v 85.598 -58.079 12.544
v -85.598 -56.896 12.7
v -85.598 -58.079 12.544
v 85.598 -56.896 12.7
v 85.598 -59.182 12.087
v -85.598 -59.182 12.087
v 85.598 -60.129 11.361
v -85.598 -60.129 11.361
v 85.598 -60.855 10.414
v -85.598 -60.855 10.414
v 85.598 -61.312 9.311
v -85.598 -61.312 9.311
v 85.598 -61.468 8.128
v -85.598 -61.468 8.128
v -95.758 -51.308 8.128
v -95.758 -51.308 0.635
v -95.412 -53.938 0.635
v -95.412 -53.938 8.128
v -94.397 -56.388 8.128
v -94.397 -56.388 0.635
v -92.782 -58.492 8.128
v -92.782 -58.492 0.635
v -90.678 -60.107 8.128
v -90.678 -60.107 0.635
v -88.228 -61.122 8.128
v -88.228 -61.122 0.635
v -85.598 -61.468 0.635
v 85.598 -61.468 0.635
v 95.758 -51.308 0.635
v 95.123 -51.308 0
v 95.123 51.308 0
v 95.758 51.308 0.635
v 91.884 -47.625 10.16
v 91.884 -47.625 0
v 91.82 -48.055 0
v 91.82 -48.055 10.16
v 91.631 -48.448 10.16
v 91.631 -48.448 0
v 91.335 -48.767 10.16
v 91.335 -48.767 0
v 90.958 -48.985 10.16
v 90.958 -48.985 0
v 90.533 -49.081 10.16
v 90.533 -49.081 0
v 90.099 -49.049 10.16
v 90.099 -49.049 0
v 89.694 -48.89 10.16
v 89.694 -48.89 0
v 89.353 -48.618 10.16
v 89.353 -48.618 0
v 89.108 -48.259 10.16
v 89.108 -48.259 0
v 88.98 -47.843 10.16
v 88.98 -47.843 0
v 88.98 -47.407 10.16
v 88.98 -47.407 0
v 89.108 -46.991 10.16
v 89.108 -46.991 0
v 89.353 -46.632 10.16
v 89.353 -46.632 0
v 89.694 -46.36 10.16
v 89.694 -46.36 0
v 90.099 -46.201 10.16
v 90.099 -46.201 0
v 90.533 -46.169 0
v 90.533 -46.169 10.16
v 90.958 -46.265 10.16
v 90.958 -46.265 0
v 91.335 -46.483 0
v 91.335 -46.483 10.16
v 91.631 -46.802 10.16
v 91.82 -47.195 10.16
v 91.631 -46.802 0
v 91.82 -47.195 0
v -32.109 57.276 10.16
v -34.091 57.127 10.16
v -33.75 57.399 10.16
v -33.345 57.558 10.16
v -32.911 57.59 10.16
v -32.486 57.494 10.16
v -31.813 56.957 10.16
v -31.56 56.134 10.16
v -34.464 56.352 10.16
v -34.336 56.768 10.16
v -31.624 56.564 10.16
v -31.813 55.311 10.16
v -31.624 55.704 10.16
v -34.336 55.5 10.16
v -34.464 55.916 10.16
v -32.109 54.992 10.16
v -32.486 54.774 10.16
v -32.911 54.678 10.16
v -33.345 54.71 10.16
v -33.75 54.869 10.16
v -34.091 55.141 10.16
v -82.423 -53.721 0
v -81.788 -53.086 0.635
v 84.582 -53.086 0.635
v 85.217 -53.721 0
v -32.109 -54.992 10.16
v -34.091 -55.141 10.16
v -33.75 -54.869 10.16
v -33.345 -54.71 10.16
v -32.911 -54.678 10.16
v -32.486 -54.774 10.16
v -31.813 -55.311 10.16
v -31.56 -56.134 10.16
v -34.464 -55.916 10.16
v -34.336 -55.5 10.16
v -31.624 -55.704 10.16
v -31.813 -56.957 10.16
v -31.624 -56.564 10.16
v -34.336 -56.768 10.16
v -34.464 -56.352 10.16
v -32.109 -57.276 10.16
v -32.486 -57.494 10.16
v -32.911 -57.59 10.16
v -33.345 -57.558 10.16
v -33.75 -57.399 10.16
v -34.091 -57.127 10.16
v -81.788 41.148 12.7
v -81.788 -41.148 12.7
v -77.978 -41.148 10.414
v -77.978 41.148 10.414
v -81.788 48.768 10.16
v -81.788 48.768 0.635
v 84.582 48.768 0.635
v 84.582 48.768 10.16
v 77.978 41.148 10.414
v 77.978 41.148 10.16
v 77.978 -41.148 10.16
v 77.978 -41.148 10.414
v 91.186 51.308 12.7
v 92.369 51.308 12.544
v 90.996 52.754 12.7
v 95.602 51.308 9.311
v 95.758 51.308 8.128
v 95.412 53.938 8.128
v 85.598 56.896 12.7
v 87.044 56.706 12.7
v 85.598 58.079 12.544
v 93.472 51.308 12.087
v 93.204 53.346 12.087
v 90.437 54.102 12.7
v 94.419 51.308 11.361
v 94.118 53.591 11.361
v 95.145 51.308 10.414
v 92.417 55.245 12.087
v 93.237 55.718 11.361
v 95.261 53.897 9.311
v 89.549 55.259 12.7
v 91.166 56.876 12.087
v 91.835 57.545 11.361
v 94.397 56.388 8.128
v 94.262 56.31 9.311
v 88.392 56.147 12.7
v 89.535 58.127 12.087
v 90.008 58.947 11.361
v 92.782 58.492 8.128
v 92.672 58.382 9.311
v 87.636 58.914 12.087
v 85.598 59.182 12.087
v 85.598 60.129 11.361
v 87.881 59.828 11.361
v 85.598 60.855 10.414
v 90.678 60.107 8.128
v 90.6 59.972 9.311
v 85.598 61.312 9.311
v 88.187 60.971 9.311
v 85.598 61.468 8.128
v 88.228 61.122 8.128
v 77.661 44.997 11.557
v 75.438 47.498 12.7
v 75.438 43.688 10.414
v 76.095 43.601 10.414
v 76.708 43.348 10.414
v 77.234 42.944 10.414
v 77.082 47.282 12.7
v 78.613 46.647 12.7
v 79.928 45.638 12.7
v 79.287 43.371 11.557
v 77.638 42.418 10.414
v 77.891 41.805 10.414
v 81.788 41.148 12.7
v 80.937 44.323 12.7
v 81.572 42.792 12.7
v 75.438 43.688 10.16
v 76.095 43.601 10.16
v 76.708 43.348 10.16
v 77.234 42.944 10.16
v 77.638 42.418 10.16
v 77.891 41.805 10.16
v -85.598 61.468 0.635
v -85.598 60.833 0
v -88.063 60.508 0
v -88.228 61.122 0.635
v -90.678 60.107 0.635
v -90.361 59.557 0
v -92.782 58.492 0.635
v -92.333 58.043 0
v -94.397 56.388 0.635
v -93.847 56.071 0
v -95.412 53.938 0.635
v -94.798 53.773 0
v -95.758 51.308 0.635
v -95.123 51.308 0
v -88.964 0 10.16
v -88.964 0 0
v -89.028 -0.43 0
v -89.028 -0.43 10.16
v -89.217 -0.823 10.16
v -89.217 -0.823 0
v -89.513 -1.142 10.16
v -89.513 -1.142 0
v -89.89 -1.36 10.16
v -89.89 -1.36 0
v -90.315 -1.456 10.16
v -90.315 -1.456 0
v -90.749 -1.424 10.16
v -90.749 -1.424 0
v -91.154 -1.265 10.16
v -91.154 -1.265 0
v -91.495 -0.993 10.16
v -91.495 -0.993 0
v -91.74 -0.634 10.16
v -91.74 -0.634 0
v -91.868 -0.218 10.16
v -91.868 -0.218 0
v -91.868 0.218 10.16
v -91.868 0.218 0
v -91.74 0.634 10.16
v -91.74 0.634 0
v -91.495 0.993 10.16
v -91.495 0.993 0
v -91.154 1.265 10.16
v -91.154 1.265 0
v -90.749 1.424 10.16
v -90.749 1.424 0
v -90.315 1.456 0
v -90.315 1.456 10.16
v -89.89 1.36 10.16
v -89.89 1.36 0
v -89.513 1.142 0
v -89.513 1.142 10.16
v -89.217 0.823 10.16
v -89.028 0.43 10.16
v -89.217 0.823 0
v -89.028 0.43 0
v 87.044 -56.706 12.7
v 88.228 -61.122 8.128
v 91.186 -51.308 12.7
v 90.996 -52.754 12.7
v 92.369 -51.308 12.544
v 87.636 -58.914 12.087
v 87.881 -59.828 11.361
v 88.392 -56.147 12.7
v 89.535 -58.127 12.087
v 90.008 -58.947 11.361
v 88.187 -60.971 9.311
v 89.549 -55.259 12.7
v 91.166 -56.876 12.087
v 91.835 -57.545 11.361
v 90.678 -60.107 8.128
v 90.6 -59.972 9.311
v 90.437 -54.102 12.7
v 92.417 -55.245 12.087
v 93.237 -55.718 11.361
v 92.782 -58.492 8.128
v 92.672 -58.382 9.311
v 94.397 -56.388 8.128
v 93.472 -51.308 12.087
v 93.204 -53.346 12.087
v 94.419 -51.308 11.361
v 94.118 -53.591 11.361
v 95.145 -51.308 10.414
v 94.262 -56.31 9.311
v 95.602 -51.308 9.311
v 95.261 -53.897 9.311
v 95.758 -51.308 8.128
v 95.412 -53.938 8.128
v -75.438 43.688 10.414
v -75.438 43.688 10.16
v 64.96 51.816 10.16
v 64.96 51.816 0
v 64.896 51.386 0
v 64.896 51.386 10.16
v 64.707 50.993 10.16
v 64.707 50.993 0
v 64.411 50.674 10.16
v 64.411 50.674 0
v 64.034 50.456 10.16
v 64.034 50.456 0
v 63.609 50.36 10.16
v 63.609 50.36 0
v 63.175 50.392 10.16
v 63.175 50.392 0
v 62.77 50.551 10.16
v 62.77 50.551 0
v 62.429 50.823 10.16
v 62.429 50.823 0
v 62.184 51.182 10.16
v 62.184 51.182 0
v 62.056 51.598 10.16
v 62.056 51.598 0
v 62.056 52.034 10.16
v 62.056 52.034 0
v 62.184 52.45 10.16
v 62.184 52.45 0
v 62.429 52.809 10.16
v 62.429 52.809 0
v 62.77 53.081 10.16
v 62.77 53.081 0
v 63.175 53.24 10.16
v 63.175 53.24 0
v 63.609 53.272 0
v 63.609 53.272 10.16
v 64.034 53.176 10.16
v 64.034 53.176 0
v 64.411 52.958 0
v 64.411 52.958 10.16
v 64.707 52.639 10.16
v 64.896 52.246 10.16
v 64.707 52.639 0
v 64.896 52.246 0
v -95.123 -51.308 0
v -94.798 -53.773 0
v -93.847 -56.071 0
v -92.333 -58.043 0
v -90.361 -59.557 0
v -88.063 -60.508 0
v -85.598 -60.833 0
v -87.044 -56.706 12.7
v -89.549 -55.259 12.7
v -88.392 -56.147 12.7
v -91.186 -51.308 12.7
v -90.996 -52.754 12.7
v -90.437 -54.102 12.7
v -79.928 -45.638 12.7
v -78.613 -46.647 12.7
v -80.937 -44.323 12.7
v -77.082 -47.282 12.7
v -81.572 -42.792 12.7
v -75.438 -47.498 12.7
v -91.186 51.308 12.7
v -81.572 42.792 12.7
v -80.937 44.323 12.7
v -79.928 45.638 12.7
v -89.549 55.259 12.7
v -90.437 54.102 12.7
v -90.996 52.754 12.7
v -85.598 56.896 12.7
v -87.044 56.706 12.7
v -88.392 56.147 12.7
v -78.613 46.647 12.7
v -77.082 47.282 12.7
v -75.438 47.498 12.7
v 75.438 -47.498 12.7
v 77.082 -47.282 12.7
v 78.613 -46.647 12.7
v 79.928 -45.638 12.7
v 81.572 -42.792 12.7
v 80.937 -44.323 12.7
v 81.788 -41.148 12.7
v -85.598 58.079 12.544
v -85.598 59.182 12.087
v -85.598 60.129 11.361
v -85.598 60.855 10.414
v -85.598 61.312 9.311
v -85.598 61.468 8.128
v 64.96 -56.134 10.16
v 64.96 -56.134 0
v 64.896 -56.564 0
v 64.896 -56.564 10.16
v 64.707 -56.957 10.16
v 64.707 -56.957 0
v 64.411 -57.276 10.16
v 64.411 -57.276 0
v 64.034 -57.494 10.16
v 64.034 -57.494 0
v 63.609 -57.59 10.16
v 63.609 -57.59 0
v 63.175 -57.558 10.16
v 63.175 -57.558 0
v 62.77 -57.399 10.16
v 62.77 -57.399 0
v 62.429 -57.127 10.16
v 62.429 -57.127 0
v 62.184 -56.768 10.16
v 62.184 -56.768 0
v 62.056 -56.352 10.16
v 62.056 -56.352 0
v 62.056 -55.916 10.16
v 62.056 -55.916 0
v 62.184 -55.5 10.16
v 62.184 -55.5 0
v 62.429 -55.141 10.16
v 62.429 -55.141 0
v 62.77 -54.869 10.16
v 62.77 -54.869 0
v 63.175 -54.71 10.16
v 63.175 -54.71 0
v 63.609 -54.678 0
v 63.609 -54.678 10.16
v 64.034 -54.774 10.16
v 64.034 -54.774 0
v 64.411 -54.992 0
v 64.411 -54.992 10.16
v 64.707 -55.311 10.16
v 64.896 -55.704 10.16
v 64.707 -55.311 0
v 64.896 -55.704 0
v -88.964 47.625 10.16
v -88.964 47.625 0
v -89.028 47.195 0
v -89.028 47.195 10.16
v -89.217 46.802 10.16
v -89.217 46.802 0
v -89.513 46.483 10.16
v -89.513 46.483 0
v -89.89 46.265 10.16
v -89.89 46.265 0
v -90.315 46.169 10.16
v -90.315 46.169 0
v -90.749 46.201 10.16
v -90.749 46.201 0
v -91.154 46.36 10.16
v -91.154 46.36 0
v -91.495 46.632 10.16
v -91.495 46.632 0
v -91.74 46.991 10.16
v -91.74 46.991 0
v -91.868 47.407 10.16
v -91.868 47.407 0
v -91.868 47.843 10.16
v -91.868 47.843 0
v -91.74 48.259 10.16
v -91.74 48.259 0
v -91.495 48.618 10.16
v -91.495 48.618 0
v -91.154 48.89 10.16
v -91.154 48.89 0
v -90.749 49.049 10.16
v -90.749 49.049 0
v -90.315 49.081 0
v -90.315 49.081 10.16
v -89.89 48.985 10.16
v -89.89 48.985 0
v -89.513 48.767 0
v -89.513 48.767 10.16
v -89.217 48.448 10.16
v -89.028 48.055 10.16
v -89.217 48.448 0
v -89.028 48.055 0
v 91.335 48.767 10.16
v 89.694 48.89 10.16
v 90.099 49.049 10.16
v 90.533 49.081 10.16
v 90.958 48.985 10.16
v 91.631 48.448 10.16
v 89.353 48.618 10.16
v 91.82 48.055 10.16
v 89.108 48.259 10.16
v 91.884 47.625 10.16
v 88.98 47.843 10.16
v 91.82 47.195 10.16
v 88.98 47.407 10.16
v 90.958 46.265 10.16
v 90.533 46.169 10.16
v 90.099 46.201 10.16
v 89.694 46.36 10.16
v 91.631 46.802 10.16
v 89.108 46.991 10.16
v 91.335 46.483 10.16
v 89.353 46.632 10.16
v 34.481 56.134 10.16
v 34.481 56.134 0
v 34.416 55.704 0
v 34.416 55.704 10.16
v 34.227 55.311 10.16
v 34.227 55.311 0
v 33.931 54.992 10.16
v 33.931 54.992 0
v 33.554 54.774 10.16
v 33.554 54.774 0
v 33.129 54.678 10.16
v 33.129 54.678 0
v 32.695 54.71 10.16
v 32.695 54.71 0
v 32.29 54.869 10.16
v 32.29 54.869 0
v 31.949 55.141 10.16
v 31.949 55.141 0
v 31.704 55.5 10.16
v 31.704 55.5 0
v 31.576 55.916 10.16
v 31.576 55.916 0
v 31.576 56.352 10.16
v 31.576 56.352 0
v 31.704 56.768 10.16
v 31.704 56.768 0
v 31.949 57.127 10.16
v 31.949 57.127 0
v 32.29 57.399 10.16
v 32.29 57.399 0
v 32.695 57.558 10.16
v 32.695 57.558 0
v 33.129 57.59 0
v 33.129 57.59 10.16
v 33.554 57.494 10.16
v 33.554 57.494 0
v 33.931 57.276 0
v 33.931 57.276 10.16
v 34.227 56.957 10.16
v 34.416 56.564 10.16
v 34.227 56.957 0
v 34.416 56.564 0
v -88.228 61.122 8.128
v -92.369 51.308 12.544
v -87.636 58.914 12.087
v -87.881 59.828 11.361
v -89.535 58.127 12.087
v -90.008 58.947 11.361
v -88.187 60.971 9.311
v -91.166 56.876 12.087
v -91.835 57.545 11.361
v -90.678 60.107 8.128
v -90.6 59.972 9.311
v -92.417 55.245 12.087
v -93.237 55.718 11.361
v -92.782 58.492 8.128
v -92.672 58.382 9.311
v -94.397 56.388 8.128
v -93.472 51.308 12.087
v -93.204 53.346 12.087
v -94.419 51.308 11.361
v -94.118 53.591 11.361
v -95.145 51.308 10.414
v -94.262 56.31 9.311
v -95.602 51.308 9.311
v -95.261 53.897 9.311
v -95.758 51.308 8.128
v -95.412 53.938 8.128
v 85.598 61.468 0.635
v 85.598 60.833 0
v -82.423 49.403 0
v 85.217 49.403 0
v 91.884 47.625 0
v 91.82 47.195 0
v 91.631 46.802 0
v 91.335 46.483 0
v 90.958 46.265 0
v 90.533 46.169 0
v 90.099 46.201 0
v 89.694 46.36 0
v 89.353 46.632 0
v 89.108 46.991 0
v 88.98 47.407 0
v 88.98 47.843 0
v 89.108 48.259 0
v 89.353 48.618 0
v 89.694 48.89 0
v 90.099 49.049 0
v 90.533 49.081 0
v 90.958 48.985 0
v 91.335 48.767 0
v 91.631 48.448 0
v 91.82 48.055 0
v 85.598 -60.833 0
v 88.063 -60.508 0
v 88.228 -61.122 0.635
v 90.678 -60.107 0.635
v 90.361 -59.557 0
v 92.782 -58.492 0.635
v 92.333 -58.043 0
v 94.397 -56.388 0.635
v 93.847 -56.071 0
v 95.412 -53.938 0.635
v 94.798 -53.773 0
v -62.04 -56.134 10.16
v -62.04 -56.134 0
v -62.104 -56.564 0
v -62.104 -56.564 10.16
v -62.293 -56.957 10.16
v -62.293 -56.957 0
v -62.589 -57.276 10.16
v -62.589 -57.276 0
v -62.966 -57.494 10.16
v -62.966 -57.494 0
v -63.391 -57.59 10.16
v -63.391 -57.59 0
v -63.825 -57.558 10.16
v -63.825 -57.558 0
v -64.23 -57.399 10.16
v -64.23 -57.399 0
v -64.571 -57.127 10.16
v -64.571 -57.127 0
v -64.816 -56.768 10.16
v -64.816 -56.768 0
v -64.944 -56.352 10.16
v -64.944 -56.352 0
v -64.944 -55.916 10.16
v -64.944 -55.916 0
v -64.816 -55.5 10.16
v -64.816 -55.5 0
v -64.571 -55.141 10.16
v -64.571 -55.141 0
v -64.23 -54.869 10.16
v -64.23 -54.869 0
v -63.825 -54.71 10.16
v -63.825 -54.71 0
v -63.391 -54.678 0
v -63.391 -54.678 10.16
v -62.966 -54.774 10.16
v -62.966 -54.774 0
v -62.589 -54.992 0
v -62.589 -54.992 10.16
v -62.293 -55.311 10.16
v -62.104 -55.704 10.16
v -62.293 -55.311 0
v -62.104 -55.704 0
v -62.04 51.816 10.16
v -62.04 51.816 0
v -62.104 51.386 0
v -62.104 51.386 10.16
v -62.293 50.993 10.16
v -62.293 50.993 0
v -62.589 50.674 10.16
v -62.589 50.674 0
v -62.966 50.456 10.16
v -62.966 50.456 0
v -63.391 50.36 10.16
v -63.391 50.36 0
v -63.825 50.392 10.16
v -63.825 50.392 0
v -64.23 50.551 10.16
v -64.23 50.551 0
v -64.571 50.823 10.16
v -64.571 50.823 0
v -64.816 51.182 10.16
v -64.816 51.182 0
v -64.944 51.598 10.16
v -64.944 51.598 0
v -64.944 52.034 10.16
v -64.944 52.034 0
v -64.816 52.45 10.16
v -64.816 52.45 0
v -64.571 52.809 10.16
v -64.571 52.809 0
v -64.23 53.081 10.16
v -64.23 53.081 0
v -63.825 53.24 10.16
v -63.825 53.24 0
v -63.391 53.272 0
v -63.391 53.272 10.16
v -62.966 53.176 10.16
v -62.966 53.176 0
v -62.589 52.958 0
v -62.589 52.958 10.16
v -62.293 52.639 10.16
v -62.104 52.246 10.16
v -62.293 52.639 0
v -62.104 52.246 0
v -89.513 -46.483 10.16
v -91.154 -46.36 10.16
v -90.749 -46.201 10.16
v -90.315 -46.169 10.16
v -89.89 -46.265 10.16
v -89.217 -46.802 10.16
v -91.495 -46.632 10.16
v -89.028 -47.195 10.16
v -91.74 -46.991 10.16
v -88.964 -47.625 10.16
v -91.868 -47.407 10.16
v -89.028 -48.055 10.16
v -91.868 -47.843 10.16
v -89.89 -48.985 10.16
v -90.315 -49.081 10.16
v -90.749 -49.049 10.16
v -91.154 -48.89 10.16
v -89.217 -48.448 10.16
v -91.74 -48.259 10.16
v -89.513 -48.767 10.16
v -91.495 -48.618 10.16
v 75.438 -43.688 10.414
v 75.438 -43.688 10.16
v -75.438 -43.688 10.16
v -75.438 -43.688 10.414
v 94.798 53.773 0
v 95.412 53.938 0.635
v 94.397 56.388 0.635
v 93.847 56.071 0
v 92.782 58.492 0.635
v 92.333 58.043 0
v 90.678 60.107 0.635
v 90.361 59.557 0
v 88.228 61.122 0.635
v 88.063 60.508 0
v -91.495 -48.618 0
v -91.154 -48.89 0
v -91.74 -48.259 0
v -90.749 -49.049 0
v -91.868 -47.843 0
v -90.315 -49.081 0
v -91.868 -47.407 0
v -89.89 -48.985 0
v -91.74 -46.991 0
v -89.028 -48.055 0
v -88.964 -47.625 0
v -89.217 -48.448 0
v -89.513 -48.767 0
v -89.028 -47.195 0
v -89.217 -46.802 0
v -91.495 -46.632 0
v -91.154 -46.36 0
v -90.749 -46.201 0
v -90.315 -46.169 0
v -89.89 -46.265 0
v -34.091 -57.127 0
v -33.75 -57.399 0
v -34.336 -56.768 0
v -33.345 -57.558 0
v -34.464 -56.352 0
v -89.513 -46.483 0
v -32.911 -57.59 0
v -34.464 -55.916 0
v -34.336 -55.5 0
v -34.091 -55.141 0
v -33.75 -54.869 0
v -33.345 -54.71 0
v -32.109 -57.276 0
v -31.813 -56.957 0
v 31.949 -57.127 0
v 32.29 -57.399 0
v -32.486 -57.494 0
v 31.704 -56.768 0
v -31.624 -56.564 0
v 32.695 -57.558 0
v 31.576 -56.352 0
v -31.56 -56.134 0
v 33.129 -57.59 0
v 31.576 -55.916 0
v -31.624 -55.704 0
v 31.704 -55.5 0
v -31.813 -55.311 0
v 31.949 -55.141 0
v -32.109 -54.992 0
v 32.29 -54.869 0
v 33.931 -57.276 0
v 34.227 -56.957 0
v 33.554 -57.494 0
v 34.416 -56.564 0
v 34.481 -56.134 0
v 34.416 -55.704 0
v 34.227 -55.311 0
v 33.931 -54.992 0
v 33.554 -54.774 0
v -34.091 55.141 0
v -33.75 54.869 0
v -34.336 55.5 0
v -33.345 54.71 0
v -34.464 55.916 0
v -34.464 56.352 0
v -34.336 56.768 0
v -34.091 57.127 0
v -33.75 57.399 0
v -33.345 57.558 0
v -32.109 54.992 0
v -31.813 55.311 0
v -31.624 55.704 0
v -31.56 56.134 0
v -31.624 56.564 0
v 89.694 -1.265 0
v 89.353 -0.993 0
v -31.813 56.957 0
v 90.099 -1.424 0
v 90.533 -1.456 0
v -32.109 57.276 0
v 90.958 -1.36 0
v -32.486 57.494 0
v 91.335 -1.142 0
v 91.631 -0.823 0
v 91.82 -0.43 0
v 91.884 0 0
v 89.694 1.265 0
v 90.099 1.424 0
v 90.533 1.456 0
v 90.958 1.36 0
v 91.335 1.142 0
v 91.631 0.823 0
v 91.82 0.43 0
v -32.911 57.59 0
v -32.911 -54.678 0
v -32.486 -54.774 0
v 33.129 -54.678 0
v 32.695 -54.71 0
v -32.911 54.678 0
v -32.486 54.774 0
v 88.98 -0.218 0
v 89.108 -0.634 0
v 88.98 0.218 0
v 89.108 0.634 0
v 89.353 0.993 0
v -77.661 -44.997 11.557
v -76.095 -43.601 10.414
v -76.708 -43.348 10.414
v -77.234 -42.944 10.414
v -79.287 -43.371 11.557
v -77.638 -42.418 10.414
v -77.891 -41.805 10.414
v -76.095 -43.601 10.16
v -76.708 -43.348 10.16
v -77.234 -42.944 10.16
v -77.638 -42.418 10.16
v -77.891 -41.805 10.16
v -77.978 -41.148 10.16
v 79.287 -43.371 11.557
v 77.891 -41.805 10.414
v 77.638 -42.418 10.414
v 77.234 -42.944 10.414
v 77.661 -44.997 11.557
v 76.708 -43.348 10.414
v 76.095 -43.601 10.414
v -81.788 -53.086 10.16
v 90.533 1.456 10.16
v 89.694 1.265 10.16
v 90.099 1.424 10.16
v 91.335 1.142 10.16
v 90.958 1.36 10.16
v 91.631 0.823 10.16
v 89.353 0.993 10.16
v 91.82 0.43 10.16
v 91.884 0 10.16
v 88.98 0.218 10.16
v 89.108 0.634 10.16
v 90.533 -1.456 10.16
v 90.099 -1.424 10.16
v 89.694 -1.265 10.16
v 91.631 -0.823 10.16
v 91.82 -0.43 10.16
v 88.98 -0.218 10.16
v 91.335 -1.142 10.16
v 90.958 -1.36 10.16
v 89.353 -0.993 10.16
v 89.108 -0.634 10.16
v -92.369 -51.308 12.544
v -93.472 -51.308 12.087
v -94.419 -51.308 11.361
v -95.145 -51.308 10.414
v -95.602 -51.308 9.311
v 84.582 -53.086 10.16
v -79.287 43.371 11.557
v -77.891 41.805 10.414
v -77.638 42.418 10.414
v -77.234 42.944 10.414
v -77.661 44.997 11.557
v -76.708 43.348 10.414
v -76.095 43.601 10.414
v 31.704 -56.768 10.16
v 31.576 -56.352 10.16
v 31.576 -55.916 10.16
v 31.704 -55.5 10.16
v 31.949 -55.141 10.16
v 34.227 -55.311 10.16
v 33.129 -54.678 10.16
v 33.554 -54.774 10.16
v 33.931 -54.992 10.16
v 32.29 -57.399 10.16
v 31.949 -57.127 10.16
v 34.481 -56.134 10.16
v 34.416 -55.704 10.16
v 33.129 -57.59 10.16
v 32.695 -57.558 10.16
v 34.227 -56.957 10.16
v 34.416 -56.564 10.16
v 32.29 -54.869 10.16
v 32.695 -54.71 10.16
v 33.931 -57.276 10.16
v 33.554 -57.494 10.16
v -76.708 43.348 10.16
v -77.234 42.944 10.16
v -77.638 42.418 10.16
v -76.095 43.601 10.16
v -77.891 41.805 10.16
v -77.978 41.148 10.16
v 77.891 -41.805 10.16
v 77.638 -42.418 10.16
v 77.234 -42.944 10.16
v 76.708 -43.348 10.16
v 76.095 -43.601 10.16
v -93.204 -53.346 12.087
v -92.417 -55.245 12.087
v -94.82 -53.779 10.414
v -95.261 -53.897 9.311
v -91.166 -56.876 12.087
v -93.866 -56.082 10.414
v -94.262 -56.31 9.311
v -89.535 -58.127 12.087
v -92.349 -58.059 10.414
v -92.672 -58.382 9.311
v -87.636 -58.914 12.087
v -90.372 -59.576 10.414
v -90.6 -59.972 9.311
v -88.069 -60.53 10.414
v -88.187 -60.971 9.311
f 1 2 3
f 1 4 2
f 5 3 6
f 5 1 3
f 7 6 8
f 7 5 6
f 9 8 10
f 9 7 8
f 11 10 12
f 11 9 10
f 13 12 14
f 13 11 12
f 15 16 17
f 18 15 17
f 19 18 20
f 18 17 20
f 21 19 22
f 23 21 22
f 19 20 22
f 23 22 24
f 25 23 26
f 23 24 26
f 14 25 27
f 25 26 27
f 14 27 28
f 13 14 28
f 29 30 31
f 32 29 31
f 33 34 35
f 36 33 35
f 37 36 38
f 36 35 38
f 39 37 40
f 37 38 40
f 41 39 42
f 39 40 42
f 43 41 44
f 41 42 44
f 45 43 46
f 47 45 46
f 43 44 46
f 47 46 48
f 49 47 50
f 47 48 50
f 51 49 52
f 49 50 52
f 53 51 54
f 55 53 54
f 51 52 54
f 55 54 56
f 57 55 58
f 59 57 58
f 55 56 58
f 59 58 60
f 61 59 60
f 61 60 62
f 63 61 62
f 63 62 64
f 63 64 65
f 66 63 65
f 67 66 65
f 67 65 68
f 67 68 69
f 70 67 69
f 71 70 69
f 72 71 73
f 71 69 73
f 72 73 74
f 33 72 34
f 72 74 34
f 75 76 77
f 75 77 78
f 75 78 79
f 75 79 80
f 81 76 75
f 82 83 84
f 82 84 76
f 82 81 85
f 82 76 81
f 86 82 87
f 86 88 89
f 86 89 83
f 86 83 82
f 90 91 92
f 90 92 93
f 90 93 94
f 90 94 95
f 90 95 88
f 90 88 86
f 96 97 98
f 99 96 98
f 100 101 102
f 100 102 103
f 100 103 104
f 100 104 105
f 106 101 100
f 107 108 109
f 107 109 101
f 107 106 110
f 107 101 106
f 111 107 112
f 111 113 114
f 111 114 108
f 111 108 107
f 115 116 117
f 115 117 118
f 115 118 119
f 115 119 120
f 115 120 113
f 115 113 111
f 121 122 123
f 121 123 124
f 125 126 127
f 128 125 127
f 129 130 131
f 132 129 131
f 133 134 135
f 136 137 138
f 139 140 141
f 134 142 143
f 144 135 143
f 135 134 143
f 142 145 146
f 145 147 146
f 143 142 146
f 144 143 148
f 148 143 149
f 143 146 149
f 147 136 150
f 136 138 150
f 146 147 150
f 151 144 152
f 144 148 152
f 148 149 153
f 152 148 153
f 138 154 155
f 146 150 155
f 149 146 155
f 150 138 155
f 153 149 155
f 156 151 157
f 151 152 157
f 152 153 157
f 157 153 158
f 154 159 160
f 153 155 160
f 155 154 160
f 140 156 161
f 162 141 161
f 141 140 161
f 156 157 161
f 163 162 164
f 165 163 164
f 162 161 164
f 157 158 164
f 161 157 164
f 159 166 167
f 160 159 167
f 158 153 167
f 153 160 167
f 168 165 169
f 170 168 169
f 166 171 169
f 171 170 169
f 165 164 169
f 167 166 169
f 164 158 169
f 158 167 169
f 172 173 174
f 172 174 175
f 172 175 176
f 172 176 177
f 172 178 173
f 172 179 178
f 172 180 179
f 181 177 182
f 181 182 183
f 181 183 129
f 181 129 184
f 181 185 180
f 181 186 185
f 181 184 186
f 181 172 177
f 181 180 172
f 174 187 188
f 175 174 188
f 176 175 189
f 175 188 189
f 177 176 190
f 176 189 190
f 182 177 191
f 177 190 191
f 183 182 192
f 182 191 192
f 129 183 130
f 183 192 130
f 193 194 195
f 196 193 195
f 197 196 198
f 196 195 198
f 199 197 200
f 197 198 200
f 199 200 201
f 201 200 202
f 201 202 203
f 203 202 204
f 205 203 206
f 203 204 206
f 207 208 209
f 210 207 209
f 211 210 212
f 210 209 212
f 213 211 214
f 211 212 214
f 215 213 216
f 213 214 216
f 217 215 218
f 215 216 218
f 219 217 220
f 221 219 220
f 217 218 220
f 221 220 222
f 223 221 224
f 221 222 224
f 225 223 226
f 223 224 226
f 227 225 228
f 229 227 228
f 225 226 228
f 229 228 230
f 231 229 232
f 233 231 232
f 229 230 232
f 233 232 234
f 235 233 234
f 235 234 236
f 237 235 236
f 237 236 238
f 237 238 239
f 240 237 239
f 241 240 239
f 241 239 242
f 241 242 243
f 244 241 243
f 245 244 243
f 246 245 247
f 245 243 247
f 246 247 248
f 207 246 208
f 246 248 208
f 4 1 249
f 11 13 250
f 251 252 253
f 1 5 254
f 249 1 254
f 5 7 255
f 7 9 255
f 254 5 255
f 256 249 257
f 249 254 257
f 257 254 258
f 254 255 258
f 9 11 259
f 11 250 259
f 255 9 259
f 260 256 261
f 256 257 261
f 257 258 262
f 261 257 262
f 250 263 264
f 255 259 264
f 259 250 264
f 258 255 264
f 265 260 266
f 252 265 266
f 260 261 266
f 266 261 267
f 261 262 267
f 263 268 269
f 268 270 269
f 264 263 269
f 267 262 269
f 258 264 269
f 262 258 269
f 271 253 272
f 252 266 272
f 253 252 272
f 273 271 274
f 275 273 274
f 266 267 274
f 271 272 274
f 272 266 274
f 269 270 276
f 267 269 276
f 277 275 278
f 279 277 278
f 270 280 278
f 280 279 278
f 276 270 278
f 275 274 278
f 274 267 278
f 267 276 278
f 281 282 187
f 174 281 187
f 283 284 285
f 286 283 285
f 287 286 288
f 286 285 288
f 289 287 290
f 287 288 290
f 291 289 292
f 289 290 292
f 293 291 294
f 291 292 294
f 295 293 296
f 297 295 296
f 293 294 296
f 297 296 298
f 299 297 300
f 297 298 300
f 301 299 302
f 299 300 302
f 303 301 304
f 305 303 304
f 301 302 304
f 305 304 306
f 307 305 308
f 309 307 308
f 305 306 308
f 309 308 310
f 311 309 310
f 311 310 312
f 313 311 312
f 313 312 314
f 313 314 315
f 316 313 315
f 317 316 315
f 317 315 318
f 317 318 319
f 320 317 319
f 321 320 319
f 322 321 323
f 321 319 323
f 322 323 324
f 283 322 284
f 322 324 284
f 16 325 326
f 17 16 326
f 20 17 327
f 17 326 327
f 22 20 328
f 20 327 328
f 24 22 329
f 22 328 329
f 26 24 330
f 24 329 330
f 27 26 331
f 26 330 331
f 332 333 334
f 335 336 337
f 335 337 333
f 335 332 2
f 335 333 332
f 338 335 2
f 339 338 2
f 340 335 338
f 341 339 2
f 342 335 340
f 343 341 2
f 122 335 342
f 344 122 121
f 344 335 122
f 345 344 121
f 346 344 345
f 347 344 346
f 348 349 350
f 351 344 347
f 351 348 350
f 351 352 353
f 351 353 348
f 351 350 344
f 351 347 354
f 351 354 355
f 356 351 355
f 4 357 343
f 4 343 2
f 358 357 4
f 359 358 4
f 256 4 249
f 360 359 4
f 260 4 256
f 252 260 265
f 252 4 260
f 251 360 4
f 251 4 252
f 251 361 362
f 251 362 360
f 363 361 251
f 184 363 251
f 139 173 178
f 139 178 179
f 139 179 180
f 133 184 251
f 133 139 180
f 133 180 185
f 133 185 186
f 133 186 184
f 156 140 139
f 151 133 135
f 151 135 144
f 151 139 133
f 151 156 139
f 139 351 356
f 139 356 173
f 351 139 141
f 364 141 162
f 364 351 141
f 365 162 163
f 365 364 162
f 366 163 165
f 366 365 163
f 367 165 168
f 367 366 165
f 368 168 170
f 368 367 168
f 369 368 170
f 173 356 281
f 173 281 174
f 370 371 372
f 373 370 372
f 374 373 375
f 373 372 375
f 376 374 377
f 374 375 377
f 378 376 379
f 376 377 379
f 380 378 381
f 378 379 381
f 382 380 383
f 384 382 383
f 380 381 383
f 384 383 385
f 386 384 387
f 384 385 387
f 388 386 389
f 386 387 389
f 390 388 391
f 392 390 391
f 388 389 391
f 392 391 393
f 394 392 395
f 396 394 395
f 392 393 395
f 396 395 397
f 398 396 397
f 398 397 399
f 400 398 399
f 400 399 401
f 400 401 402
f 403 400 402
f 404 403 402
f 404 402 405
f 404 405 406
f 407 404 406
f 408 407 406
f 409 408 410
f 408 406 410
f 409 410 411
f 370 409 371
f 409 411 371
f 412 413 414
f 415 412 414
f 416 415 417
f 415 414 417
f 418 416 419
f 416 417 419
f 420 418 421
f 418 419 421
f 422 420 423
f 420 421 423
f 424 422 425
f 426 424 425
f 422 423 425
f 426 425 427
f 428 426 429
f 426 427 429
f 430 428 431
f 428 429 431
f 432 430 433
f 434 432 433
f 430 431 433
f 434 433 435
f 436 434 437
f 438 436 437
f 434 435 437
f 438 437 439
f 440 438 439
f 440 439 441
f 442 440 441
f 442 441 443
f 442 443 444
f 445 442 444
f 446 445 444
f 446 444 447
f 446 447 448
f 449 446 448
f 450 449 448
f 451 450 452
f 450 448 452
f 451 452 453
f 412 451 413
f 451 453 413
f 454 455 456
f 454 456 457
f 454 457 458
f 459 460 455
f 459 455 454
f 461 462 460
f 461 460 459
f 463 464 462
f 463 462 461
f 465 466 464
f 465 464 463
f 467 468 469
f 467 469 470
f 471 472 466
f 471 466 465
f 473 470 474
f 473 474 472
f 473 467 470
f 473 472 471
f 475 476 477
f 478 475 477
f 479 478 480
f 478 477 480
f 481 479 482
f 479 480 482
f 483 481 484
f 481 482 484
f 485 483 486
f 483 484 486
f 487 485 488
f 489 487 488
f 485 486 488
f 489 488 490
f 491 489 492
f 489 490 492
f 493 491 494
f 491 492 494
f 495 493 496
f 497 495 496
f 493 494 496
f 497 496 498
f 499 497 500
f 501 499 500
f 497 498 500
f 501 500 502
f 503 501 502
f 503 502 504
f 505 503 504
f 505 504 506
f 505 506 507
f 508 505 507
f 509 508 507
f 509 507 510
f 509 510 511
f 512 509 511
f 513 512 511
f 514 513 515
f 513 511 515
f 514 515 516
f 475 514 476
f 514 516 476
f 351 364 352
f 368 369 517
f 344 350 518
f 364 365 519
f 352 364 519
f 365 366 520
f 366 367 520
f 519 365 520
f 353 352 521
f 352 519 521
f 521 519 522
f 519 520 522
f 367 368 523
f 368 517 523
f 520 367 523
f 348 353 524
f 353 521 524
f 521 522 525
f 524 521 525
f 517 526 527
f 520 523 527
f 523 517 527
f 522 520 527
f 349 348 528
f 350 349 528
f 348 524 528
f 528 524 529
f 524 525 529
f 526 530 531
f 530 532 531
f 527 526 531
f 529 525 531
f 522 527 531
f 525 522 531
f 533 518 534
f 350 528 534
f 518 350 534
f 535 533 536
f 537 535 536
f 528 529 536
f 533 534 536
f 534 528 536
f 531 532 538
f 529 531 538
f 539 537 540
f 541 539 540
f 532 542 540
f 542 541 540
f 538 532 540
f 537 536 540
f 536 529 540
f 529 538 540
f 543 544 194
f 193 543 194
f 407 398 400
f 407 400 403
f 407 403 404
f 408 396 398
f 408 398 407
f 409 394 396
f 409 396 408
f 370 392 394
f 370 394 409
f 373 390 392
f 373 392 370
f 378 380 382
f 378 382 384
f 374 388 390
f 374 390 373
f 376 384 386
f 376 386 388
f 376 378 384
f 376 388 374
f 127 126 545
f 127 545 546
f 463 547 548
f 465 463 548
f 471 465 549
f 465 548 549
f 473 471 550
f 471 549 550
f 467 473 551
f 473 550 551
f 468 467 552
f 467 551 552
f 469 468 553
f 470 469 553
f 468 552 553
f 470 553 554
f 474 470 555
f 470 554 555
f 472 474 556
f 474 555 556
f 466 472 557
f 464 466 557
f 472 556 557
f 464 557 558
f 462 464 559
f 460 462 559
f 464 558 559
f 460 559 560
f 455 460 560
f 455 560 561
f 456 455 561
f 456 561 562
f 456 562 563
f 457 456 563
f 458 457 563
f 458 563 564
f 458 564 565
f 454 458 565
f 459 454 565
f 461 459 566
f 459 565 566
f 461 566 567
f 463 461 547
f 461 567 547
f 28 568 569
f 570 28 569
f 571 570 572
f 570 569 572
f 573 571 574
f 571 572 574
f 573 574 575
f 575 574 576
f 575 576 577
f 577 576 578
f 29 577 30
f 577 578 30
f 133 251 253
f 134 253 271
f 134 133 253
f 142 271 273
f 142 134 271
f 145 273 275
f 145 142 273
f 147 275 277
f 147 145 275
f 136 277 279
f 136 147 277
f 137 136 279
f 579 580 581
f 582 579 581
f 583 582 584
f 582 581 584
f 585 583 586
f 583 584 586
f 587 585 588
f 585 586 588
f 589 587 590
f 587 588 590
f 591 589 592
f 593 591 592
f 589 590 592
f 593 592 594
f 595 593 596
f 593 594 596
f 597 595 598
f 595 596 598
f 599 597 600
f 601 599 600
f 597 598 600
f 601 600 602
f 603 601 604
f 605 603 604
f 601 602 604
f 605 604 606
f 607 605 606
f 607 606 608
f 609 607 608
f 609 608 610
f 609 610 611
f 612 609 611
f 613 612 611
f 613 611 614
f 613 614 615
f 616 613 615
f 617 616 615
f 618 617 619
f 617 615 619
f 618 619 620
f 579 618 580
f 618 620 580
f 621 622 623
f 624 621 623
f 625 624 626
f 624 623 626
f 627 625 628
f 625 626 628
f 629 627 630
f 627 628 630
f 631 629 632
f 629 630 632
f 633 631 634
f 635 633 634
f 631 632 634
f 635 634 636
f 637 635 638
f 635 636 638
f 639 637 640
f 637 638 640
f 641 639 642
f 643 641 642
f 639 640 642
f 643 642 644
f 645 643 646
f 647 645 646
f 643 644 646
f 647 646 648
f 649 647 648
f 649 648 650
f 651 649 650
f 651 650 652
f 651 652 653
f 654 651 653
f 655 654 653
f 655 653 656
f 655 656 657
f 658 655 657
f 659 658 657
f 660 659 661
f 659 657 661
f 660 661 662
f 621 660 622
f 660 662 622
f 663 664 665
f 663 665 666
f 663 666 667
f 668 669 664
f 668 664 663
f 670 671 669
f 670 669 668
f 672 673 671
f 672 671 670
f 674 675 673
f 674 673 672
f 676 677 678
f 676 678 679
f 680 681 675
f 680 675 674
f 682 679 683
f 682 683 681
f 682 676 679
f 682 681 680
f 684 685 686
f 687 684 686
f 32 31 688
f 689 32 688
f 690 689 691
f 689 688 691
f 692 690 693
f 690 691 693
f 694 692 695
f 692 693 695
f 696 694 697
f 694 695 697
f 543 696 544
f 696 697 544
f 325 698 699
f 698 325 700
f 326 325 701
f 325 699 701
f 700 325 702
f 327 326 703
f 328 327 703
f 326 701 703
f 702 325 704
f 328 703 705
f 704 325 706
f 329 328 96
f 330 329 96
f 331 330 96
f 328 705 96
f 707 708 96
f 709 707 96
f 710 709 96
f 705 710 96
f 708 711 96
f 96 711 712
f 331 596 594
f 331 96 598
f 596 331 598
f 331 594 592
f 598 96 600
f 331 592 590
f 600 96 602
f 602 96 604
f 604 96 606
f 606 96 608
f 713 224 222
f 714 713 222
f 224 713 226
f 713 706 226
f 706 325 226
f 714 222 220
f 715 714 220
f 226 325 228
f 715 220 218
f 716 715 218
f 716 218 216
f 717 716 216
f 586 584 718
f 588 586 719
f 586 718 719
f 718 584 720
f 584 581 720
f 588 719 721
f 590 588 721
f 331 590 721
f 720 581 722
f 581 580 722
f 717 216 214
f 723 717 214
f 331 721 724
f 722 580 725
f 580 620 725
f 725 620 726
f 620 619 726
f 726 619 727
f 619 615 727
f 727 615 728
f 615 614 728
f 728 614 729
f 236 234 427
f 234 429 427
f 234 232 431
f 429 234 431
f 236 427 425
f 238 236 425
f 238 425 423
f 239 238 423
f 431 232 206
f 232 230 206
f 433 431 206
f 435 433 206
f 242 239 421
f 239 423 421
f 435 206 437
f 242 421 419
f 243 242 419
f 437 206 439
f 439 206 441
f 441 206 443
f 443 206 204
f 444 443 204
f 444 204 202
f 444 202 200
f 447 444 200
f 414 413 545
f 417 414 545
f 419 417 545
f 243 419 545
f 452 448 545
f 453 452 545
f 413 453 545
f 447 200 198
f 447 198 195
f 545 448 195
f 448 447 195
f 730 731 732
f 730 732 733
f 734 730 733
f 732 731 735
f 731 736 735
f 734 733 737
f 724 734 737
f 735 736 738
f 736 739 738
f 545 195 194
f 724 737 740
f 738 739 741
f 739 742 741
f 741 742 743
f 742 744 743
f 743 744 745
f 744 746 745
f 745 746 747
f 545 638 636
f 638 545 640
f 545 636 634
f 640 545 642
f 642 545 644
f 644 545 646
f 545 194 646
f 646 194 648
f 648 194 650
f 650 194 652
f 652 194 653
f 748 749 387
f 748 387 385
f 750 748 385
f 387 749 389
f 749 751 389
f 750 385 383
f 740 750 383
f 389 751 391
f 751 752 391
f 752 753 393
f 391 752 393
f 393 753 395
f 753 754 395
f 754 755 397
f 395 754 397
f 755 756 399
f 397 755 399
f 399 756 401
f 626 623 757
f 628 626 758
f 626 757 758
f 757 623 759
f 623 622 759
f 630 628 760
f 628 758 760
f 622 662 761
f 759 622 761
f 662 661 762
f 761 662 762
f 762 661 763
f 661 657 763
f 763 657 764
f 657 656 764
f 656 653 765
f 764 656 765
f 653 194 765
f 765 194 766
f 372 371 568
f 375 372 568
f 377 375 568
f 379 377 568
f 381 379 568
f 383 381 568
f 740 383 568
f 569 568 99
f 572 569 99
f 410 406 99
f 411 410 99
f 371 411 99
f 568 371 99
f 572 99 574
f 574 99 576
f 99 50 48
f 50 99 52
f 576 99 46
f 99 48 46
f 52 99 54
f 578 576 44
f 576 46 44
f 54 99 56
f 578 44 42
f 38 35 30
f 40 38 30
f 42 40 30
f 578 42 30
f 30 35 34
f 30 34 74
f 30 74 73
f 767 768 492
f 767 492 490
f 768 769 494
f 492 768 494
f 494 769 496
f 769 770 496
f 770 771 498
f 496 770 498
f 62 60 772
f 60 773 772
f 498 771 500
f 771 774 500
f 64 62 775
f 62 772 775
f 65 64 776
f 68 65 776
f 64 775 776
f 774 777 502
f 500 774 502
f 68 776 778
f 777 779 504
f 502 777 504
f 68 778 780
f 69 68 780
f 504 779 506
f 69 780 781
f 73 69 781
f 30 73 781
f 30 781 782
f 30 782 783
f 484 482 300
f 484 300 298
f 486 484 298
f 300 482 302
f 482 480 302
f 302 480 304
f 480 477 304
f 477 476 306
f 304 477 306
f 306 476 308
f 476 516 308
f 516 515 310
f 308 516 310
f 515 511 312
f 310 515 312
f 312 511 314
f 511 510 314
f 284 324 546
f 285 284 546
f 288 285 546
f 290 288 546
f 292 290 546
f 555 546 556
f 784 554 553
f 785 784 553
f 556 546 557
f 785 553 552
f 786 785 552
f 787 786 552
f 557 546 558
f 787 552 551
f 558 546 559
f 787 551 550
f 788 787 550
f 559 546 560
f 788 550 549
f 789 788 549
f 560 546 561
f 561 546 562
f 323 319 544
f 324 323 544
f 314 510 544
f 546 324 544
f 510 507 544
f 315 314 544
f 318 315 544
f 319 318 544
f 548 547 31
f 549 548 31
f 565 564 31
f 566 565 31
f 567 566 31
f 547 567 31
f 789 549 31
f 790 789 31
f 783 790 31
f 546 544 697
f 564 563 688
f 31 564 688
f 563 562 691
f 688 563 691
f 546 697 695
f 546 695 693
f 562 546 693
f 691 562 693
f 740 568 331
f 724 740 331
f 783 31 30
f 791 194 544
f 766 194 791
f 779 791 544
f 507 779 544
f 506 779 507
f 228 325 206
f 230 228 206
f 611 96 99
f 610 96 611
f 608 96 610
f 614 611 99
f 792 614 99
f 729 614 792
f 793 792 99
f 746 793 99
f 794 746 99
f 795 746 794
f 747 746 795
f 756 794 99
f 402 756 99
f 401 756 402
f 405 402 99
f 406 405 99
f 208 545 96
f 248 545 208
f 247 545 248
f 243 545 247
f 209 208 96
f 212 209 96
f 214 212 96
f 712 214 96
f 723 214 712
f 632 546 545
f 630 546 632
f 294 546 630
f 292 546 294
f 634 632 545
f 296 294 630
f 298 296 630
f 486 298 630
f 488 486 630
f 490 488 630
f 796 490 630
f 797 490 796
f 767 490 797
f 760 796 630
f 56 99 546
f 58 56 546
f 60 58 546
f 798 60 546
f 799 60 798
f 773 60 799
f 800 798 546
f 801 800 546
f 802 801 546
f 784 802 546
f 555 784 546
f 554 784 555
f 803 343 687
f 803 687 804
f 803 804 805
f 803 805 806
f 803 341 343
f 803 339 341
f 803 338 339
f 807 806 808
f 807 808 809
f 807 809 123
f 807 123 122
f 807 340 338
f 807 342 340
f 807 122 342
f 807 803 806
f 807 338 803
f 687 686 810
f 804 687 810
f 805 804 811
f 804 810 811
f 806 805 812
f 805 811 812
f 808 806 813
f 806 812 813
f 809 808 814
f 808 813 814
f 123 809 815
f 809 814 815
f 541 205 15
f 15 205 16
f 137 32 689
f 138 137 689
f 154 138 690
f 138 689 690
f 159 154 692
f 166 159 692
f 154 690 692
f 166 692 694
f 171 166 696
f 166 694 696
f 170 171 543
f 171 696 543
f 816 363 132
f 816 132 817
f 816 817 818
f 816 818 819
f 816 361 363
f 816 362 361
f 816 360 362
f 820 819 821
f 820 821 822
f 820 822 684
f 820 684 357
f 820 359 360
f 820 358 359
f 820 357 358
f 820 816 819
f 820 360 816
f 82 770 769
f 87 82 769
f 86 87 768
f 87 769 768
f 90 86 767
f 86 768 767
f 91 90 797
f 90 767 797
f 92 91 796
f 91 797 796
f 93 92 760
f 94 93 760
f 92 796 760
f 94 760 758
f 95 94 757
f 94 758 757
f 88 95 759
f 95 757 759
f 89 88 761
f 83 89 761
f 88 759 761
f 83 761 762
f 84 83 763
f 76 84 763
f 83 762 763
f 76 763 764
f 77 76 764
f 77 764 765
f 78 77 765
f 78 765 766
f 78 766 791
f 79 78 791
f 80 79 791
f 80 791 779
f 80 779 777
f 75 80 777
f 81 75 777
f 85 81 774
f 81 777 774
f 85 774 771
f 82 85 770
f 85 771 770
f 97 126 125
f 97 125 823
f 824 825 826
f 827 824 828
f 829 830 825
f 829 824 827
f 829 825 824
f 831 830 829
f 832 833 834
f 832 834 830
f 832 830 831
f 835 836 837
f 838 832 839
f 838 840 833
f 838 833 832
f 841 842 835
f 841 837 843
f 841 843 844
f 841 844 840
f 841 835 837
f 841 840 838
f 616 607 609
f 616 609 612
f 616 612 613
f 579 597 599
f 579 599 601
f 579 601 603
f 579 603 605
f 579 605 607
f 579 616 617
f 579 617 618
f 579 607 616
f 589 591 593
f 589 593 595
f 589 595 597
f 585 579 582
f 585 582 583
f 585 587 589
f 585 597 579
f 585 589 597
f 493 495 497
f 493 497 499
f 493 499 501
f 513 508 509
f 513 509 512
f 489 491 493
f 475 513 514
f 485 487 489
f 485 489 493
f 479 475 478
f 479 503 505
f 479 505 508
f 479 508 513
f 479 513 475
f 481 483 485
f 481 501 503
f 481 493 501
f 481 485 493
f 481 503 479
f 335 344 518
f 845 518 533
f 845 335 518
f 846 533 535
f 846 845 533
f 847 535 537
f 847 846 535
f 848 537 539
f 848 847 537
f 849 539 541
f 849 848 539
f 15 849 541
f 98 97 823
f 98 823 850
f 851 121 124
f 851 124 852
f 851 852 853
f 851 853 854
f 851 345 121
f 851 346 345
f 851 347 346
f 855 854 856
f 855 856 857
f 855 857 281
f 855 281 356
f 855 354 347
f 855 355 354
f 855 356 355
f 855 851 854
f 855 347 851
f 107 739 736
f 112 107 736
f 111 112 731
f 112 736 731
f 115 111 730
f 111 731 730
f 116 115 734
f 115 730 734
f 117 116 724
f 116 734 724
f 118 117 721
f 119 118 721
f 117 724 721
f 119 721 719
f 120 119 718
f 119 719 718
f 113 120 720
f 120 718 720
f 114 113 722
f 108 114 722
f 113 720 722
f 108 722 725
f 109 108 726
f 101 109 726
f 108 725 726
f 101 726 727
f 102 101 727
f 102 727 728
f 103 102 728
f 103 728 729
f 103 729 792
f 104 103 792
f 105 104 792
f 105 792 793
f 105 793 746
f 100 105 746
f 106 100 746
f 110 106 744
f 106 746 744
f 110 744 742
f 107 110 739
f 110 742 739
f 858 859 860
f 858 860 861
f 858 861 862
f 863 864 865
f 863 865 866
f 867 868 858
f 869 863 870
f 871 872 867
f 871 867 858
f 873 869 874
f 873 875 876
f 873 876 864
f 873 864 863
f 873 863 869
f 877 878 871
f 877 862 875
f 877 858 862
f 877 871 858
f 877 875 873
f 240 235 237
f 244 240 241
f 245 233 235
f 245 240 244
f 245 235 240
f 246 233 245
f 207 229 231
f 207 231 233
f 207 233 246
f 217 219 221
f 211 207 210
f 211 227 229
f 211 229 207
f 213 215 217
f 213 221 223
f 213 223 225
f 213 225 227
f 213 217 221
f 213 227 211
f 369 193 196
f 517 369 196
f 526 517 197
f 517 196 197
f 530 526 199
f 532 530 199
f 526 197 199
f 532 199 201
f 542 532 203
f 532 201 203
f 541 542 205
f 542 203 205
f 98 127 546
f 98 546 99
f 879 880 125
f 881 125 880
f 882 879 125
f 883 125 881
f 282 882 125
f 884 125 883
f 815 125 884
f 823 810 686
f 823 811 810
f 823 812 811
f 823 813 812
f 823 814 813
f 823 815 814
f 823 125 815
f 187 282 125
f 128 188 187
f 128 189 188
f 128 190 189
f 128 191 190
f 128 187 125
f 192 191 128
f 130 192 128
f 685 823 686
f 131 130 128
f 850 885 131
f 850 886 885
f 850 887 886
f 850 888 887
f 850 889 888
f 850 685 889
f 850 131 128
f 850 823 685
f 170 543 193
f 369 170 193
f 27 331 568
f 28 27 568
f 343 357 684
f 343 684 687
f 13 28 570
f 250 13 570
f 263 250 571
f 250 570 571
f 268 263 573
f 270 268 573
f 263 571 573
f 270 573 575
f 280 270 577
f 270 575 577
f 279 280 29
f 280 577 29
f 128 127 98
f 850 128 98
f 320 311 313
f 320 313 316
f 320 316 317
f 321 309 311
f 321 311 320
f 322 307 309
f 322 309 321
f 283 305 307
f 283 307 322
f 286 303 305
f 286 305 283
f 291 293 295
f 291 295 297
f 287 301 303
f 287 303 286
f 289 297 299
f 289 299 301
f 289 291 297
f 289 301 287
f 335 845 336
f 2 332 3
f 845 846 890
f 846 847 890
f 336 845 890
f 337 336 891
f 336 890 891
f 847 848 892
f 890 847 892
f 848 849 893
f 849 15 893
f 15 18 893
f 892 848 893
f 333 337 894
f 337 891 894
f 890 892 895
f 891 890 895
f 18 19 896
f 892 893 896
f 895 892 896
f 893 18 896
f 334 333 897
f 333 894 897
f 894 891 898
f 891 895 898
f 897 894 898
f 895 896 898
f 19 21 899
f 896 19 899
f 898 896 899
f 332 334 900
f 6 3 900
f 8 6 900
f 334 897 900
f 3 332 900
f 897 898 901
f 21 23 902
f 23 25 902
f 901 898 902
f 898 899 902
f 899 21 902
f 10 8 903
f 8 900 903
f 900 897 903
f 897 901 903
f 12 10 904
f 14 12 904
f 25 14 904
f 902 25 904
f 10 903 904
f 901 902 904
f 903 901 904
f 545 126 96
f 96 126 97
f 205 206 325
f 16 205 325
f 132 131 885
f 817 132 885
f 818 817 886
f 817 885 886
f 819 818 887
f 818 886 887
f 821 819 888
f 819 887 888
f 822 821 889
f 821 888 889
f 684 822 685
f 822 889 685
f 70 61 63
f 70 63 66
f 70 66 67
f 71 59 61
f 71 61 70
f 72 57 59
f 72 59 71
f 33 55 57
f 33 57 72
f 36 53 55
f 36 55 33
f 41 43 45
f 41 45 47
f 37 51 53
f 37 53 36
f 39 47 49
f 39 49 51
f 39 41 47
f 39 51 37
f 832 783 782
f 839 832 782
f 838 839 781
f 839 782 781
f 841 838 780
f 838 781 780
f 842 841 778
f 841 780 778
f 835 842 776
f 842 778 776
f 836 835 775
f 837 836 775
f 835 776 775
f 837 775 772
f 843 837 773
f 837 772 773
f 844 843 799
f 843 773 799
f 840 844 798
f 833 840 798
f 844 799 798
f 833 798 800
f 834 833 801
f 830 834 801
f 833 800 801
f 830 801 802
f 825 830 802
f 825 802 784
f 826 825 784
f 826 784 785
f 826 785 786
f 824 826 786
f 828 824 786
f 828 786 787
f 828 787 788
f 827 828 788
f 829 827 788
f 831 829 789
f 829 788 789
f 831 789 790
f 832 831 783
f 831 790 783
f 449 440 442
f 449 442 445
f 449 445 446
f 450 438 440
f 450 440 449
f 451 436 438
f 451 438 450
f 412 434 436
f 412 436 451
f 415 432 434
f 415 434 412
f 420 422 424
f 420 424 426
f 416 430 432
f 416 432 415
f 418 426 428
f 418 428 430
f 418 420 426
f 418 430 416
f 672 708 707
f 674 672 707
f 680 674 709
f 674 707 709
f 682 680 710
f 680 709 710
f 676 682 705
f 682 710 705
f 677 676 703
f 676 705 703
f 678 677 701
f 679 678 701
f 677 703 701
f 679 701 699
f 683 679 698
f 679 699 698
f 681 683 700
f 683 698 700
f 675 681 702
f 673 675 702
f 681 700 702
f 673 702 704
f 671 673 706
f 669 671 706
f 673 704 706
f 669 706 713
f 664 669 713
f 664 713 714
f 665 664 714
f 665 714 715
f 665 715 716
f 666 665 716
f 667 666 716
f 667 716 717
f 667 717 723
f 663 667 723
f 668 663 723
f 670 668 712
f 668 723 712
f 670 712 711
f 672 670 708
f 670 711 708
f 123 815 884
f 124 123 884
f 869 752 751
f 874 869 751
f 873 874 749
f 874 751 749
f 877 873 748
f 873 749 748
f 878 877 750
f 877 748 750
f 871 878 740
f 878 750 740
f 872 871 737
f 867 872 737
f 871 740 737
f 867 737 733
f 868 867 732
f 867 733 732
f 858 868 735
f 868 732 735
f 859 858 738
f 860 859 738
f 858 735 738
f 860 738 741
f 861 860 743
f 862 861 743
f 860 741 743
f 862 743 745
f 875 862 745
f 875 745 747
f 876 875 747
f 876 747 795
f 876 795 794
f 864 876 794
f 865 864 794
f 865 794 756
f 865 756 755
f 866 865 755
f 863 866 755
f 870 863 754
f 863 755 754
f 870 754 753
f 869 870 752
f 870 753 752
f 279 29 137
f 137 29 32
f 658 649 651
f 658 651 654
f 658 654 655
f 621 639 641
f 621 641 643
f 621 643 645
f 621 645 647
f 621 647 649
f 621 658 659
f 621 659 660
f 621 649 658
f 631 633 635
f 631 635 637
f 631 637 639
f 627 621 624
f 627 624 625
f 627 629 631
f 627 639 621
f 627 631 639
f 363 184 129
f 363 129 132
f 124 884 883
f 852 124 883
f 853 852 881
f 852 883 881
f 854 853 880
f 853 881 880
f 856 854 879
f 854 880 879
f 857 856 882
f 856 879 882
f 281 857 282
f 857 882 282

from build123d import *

# Parameters (mm, degrees)
F1_DEPTH = 12.7
F2_W     = 166.37
F2_H     = 101.854
F3_DEPTH = 10.16
F4_SIZE2 = 3.81
F4_SIZE  = 2.286
F5_R     = 4.572
F6_R     = 1.4605
F7_DEPTH = 10.16
F8_SIZE  = 0.635


with BuildPart() as f1:
    # F0 (on Top) → F1 (new body)
    with BuildSketch(Plane.XY):
        with BuildLine():
            Line((85.598, 61.468), (-85.598, 61.468))
            ThreePointArc((-85.598, 61.468), (-92.7822048969, 58.4922048969), (-95.758, 51.308))
            Line((-95.758, 51.308), (-95.758, -51.308))
            ThreePointArc((-95.758, -51.308), (-92.7822048969, -58.4922048969), (-85.598, -61.468))
            Line((-85.598, -61.468), (85.598, -61.468))
            ThreePointArc((85.598, -61.468), (92.7822048969, -58.4922048969), (95.758, -51.308))
            Line((95.758, -51.308), (95.758, 51.308))
            ThreePointArc((95.758, 51.308), (92.7822048969, 58.4922048969), (85.598, 61.468))
        make_face()
        with BuildLine():
            ThreePointArc((-77.978, 41.148), (-77.2340512242, 42.9440512242), (-75.438, 43.688))
            Line((-75.438, 43.688), (75.438, 43.688))
            ThreePointArc((75.438, 43.688), (77.2340512242, 42.9440512242), (77.978, 41.148))
            Line((77.978, 41.148), (77.978, -41.148))
            ThreePointArc((77.978, -41.148), (77.2340512242, -42.9440512242), (75.438, -43.688))
            Line((75.438, -43.688), (-75.438, -43.688))
            ThreePointArc((-75.438, -43.688), (-77.2340512242, -42.9440512242), (-77.978, -41.148))
            Line((-77.978, -41.148), (-77.978, 41.148))
        make_face(mode=Mode.SUBTRACT)
    extrude(amount=F1_DEPTH)

    # F2 (on face) → F3 (cut)
    with BuildSketch(Plane(origin=(0, 0, 0), x_dir=(1, 0, 0), z_dir=(0, 0, -1))):
        with Locations((1.397, 2.159)):
            Rectangle(F2_W, F2_H)
    extrude(amount=-F3_DEPTH, mode=Mode.SUBTRACT)

    # F4
    f4_edges = [f1.edges().sort_by_distance(p)[0] for p in [
        (0, -43.688, 12.7),
    ]]
    f4_side = f1.faces().sort_by_distance((0, -43.688, 11.43))[0]
    chamfer(f4_edges, length=F4_SIZE, length2=F4_SIZE2, reference=f4_side)

    # F5
    f5_edges = [f1.edges().sort_by_distance(p)[0] for p in [
        (0, -61.468, 12.7),
    ]]
    fillet(f5_edges, radius=F5_R)

    # F6 (on face) → F7 (cut)
    with BuildSketch(Plane(origin=(0, 0, 0), x_dir=(1, 0, 0), z_dir=(0, 0, -1))):
        with Locations((-63.5, 56.134)):
            Circle(F6_R)
        with Locations((63.5, 56.134)):
            Circle(F6_R)
        with Locations((-63.5, -51.816)):
            Circle(F6_R)
        with Locations((63.5, -51.816)):
            Circle(F6_R)
        with Locations((-90.424, 47.625)):
            Circle(F6_R)
        with Locations((-90.424, -47.625)):
            Circle(F6_R)
        with Locations((90.424, -47.625)):
            Circle(F6_R)
        with Locations((90.424, 47.625)):
            Circle(F6_R)
        with Locations((-90.424, 0)):
            Circle(F6_R)
        with Locations((90.424, 0)):
            Circle(F6_R)
        with Locations((-33.02, 56.134)):
            Circle(F6_R)
        with Locations((33.02, 56.134)):
            Circle(F6_R)
        with Locations((-33.02, -56.134)):
            Circle(F6_R)
        with Locations((33.02, -56.134)):
            Circle(F6_R)
    extrude(amount=-F7_DEPTH, mode=Mode.SUBTRACT)

    # F8
    f8_edges = [f1.edges().sort_by_distance(p)[0] for p in [
        (1.397, -53.086, 0),
        (0, -61.468, 0),
        (-81.788, -2.159, 0),
        (1.397, 48.768, 0),
        (84.582, -2.159, 0),
    ]]
    chamfer(f8_edges, length=F8_SIZE)


solid = f1.part
